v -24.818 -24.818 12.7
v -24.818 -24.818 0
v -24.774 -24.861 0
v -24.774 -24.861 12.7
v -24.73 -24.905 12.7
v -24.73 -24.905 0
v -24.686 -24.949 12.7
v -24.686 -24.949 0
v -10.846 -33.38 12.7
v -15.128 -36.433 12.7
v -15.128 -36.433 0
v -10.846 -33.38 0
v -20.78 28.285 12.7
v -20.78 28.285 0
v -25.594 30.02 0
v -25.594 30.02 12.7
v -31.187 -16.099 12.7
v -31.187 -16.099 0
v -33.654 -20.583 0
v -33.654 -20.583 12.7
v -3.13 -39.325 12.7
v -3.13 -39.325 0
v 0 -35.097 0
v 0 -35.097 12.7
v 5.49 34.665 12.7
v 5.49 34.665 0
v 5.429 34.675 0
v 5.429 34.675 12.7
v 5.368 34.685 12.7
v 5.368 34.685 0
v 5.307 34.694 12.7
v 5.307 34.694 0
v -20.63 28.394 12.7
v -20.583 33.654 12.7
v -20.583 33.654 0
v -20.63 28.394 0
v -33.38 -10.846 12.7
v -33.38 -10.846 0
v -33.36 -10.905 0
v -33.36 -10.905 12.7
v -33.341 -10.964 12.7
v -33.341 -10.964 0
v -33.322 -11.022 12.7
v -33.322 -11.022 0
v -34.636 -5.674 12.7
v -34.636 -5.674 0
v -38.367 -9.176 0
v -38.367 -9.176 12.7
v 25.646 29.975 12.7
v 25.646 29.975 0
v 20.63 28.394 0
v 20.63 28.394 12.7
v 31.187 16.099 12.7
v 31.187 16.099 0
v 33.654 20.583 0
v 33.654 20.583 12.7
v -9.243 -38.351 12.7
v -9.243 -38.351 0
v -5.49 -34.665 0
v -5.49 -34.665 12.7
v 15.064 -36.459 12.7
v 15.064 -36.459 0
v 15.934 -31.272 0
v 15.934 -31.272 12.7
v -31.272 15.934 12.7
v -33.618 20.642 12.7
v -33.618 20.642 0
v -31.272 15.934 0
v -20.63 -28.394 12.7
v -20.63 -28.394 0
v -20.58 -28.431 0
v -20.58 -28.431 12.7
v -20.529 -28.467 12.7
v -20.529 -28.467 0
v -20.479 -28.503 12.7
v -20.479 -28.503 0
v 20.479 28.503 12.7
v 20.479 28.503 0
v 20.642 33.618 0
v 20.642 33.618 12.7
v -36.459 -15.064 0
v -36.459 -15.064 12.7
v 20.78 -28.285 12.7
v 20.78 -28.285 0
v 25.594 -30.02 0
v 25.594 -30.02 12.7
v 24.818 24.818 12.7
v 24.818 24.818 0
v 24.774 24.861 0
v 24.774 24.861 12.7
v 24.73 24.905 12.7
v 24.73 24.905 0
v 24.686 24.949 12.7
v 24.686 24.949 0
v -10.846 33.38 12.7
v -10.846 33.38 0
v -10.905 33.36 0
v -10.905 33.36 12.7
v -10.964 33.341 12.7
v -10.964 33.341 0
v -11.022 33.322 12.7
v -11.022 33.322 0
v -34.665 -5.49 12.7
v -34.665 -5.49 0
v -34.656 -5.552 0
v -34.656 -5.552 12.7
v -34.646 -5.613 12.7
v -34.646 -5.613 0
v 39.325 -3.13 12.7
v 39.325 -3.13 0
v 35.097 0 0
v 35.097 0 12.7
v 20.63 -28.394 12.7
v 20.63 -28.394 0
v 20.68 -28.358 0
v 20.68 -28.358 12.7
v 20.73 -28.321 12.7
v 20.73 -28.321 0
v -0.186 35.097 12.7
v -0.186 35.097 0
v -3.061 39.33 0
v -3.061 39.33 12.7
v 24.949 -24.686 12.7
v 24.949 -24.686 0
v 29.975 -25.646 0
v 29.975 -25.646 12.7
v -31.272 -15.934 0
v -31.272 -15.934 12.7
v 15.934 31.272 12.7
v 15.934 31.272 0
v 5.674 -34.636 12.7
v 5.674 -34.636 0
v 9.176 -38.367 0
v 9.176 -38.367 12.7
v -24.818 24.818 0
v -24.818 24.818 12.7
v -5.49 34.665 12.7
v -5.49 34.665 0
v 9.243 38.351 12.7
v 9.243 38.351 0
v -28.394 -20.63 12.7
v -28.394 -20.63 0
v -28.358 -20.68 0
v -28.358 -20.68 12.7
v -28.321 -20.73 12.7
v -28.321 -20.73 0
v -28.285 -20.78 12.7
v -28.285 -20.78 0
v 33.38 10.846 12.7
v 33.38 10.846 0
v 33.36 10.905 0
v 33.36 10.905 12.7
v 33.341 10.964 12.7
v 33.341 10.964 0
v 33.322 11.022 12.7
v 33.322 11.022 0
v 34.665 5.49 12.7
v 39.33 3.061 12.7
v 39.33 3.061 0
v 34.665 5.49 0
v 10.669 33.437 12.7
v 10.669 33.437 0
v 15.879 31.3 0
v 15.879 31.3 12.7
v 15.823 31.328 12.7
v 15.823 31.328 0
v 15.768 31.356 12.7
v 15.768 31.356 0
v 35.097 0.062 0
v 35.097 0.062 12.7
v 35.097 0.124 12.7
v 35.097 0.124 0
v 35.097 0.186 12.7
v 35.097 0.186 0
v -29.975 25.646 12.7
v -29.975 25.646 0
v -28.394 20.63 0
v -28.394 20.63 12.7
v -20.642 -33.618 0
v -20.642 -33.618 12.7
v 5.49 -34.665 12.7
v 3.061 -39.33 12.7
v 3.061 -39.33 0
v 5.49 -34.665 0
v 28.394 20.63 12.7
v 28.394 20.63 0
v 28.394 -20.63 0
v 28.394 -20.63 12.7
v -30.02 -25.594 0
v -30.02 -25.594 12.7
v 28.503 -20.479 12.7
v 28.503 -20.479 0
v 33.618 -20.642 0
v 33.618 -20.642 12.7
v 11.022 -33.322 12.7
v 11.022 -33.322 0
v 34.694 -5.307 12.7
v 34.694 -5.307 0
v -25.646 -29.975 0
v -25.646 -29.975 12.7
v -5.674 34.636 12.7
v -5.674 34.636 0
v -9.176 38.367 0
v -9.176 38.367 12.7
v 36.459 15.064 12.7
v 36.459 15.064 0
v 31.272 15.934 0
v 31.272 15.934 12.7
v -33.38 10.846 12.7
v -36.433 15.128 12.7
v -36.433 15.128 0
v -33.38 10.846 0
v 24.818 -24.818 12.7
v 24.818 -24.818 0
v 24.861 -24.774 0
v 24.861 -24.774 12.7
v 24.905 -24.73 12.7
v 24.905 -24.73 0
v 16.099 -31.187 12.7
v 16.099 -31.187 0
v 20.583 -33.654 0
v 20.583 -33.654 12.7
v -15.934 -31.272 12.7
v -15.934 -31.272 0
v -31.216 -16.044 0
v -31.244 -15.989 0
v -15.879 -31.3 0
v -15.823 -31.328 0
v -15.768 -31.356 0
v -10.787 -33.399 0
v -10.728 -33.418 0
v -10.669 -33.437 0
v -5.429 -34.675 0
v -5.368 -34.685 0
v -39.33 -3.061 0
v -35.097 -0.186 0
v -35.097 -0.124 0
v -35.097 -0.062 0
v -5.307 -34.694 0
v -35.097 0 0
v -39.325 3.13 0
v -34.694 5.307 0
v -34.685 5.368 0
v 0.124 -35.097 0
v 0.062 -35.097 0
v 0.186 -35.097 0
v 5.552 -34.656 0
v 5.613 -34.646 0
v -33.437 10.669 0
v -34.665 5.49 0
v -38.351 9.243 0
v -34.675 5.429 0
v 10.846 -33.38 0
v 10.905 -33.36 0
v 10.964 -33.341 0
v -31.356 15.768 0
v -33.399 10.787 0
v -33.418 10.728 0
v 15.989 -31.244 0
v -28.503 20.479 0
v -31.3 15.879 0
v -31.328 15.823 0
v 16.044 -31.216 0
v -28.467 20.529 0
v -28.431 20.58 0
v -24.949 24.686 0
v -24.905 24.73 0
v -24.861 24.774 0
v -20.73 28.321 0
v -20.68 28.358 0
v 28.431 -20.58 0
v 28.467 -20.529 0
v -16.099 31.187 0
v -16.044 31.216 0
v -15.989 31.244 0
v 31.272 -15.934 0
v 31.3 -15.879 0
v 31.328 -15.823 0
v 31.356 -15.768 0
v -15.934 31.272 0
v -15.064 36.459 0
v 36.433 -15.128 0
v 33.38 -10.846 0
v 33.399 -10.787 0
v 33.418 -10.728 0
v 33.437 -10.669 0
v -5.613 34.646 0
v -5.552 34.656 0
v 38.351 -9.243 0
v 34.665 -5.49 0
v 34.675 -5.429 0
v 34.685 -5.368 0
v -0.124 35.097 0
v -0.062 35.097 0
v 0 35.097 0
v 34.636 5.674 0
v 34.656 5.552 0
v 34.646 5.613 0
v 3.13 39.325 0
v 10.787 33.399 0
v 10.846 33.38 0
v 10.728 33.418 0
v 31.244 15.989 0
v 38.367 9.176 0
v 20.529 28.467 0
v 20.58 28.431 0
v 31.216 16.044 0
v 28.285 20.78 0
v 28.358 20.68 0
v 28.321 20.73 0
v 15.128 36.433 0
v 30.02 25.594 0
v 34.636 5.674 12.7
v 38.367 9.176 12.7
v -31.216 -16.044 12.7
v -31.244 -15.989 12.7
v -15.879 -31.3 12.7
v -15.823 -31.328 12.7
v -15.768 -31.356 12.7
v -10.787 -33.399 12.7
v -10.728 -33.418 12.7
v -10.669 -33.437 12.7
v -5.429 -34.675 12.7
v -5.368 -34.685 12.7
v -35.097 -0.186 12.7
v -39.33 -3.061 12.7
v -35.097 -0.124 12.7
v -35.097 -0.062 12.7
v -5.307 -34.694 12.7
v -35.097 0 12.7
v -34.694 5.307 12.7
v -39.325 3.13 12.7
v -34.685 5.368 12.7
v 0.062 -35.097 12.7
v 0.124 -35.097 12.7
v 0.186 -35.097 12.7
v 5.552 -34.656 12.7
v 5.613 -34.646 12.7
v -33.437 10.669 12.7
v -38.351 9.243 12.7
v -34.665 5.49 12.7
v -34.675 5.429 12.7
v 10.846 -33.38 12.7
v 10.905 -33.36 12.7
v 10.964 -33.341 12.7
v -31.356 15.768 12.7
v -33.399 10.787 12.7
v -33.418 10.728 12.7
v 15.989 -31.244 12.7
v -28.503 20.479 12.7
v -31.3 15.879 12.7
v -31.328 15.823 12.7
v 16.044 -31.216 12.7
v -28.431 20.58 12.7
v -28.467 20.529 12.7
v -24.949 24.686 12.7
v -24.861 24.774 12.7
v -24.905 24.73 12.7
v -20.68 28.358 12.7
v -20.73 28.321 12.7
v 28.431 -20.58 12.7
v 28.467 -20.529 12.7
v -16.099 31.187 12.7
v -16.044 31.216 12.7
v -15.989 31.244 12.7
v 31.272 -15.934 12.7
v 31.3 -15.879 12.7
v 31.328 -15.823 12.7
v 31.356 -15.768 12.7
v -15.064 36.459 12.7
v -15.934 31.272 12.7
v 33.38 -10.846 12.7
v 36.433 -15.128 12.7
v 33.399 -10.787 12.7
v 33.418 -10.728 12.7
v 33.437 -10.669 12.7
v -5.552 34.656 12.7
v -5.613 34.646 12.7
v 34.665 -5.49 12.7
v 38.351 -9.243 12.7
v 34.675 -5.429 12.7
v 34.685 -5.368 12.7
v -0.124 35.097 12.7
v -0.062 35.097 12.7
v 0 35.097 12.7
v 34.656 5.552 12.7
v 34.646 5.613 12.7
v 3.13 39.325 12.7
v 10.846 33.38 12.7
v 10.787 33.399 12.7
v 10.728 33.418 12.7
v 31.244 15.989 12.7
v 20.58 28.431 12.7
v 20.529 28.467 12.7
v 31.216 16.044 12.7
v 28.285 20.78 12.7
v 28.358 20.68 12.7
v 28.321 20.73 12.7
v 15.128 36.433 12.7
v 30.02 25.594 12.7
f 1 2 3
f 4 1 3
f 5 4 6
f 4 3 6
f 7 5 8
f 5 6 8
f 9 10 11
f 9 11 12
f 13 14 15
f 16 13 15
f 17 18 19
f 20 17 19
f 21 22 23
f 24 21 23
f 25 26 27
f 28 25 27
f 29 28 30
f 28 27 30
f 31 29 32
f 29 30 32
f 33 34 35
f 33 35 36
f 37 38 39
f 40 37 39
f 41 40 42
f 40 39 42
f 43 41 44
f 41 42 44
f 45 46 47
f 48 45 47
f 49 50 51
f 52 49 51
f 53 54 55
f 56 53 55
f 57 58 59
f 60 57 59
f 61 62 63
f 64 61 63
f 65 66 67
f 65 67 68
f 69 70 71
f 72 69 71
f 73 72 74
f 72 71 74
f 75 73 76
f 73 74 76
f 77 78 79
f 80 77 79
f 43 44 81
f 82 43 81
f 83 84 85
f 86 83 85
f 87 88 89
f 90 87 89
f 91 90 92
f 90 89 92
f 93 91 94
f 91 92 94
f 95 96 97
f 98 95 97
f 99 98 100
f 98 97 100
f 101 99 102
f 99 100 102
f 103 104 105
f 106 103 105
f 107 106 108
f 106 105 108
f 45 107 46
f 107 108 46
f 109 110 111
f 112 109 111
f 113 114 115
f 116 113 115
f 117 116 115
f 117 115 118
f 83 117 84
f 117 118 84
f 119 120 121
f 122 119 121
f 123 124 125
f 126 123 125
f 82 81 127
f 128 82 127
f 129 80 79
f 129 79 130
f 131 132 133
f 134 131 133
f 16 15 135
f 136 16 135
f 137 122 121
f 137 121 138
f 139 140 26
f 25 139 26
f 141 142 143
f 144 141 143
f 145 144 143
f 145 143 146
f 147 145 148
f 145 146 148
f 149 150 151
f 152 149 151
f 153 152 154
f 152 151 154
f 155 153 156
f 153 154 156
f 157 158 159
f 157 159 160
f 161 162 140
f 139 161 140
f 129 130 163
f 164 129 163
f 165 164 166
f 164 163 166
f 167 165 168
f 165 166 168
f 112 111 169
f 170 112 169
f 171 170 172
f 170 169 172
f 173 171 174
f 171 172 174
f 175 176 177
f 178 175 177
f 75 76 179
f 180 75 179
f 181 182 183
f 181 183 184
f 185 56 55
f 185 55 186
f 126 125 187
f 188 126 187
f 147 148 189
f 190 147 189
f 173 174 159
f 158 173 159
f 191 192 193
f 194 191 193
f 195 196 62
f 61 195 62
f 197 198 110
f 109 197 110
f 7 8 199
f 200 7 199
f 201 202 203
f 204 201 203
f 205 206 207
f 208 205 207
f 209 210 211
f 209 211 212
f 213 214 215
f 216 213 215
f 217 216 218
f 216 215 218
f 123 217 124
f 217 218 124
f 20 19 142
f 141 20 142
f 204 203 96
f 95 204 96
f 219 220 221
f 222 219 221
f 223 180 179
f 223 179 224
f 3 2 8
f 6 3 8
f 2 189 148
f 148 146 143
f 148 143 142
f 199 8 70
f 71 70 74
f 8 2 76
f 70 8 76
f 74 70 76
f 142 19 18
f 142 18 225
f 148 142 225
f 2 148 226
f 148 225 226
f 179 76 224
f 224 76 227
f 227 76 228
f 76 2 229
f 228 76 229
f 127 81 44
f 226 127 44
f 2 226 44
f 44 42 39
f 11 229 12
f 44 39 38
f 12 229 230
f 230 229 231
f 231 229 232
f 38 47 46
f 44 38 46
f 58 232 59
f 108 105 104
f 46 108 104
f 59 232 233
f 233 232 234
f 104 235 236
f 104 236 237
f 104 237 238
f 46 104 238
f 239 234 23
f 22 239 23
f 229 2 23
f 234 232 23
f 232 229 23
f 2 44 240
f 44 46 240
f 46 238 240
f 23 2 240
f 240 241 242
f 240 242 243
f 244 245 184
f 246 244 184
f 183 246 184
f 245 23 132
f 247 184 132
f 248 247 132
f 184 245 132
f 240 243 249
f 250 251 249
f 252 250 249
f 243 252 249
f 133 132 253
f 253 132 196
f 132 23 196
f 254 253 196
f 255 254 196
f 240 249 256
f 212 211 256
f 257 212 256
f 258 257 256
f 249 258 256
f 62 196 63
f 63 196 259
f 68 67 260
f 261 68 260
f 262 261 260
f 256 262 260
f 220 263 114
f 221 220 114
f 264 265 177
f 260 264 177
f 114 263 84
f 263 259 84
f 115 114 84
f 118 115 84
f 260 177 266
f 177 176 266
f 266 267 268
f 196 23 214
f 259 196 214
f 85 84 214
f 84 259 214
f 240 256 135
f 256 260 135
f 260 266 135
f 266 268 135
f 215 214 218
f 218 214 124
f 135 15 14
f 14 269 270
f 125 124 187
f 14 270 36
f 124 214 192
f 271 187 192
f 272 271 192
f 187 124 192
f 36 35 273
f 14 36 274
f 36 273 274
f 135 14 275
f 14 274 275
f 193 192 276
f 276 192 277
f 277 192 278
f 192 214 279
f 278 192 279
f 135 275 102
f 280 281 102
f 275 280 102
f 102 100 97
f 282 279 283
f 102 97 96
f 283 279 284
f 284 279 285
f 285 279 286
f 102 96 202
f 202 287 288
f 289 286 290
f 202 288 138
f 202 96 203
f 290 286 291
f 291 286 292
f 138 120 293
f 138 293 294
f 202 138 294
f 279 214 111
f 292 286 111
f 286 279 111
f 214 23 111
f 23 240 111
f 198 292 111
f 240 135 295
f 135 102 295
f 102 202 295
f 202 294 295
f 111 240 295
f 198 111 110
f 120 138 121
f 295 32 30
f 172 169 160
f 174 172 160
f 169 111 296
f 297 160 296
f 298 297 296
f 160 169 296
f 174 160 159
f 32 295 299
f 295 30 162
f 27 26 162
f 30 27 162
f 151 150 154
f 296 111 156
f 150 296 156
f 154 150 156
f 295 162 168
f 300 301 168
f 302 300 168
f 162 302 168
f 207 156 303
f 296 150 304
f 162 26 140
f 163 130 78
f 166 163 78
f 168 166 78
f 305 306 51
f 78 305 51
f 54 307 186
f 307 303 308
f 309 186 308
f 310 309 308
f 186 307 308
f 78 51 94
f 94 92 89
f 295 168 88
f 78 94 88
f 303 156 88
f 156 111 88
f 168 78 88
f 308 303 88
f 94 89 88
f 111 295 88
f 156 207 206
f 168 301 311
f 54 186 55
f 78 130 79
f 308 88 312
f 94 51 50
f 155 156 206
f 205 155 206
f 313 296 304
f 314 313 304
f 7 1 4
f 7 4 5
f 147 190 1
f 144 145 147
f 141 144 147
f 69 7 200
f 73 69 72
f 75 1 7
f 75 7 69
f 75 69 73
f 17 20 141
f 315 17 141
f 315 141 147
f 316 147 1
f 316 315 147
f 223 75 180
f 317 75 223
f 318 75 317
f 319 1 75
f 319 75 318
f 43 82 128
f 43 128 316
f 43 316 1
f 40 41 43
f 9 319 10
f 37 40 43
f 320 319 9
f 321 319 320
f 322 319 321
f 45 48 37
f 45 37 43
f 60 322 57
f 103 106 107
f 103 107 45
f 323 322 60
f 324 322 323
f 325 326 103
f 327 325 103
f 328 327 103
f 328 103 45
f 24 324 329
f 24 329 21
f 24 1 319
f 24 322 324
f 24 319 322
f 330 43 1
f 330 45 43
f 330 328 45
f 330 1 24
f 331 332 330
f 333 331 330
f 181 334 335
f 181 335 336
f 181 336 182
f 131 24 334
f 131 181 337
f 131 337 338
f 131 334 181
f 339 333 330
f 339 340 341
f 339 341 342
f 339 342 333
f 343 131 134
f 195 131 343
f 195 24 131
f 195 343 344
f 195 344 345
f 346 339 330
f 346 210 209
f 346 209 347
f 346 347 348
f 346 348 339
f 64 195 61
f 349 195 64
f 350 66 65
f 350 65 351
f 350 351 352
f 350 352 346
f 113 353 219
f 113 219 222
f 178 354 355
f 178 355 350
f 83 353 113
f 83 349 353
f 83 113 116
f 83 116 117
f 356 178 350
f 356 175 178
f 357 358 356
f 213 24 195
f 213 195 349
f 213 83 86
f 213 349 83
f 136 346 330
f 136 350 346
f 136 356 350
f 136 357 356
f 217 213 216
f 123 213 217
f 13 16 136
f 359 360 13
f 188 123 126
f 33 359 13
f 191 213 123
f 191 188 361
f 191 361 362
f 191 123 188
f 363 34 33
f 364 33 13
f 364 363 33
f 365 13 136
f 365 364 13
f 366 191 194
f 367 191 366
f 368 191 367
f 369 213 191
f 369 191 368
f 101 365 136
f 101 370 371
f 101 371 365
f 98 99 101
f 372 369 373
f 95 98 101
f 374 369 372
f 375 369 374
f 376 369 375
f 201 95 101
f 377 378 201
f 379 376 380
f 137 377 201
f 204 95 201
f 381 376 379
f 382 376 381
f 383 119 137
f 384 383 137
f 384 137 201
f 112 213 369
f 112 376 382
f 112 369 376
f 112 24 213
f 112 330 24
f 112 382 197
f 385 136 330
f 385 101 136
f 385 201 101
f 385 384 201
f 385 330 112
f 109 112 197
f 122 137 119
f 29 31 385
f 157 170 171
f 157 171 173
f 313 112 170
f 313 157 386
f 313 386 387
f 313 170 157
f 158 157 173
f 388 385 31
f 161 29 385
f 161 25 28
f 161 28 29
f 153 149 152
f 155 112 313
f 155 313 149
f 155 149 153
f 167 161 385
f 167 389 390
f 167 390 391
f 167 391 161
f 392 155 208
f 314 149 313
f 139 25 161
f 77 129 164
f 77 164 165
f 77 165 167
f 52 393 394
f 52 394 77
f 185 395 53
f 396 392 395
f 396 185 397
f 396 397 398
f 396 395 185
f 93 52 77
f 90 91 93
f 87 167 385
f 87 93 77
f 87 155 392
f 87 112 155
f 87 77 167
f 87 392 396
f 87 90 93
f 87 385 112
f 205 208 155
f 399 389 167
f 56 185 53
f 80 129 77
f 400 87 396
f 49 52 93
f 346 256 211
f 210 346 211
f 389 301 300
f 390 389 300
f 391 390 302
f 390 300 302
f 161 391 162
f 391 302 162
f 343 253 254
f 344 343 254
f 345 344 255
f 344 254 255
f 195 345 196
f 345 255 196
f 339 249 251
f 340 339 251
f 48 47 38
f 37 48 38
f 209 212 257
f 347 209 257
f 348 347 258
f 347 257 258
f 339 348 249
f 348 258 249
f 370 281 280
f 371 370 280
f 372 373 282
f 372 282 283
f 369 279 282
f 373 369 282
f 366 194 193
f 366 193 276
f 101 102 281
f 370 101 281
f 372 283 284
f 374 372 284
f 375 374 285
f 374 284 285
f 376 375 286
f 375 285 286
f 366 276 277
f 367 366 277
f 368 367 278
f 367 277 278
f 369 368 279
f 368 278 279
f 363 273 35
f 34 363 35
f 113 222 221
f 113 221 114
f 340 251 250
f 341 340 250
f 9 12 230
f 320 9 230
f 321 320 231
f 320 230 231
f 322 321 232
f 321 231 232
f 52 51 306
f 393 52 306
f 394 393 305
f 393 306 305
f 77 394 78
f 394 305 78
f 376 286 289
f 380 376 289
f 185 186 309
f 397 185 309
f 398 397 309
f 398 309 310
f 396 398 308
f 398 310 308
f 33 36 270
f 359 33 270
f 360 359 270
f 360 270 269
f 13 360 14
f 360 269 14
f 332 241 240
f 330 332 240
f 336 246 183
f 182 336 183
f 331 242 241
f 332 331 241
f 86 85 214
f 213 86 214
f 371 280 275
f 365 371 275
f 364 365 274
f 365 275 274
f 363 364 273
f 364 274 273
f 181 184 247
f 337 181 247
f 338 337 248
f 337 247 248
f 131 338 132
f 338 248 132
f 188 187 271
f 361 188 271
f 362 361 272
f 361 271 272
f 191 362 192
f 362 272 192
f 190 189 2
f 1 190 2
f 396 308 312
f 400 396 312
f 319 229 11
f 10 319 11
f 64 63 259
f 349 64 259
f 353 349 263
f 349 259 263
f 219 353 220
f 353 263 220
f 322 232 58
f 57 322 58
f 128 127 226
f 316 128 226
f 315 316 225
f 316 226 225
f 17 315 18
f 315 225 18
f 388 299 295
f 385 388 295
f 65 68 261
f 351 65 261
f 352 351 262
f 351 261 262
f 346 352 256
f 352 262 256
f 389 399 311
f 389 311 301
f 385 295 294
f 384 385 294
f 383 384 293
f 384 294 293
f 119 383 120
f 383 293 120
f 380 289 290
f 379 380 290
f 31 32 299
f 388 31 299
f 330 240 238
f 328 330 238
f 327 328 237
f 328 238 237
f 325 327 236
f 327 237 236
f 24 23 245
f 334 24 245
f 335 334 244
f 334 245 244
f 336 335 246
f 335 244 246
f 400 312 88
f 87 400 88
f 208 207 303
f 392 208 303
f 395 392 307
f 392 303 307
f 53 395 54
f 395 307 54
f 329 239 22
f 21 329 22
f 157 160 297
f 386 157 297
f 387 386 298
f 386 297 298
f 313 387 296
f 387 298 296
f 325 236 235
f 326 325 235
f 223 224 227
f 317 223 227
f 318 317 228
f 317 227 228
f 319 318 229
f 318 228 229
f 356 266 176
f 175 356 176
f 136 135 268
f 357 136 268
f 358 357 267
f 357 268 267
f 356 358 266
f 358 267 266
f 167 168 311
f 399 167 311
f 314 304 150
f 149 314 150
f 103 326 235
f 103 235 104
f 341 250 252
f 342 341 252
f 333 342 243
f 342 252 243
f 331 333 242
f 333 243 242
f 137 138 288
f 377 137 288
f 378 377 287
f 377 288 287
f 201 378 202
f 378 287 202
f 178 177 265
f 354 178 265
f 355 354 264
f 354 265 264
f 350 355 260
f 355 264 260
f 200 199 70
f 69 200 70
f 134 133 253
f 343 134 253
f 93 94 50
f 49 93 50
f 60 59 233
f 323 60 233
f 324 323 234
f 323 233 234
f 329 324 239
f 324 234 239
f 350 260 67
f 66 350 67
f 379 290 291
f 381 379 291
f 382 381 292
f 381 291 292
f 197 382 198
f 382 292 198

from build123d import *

# Parameters (mm, degrees)
F1_DEPTH = 12.7


with BuildPart() as f1:
    # F0 (on Top) → F1 (new body)
    with BuildSketch(Plane.XY):
        with BuildLine():
            ThreePointArc((34.693947, -5.306769), (34.996437, -2.661044), (35.09746, 0))
            ThreePointArc((35.09746, 0), (35.097337, 0.092948), (35.096968, 0.185896))
            ThreePointArc((35.096968, 0.185896), (34.981851, 2.846367), (34.665353, 5.490452))
            ThreePointArc((34.665353, 5.490452), (34.650691, 5.582237), (34.635786, 5.673982))
            ThreePointArc((34.635786, 5.673982), (34.105897, 8.283691), (33.379669, 10.845712))
            ThreePointArc((33.379669, 10.845712), (33.350829, 10.934073), (33.321755, 11.022357))
            ThreePointArc((33.321755, 11.022357), (32.390142, 13.517042), (31.272066, 15.933914))
            ThreePointArc((31.272066, 15.933914), (31.229759, 16.016675), (31.187233, 16.099324))
            ThreePointArc((31.187233, 16.099324), (29.876834, 18.41756), (28.394442, 20.62977))
            ThreePointArc((28.394442, 20.62977), (28.339709, 20.704894), (28.284777, 20.779873))
            ThreePointArc((28.284777, 20.779873), (26.62786, 22.864576), (24.817652, 24.817652))
            ThreePointArc((24.817652, 24.817652), (24.751841, 24.88329), (24.685856, 24.948752))
            ThreePointArc((24.685856, 24.948752), (22.723219, 26.74859), (20.62977, 28.394442))
            ThreePointArc((20.62977, 28.394442), (20.554501, 28.448976), (20.479088, 28.50331))
            ThreePointArc((20.479088, 28.50331), (18.259057, 29.973965), (15.933914, 31.272066))
            ThreePointArc((15.933914, 31.272066), (15.85104, 31.314154), (15.768056, 31.356022))
            ThreePointArc((15.768056, 31.356022), (13.345297, 32.461281), (10.845712, 33.379669))
            ThreePointArc((10.845712, 33.379669), (10.757275, 33.408274), (10.668762, 33.436645))
            ThreePointArc((10.668762, 33.436645), (8.102931, 34.149293), (5.490452, 34.665353))
            ThreePointArc((5.490452, 34.665353), (5.398629, 34.679771), (5.306769, 34.693947))
            ThreePointArc((5.306769, 34.693947), (2.661044, 34.996437), (0, 35.09746))
            ThreePointArc((0, 35.09746), (-0.092948, 35.097337), (-0.185896, 35.096968))
            ThreePointArc((-0.185896, 35.096968), (-2.846367, 34.981851), (-5.490452, 34.665353))
            ThreePointArc((-5.490452, 34.665353), (-5.582237, 34.650691), (-5.673982, 34.635786))
            ThreePointArc((-5.673982, 34.635786), (-8.283691, 34.105897), (-10.845712, 33.379669))
            ThreePointArc((-10.845712, 33.379669), (-10.934073, 33.350829), (-11.022357, 33.321755))
            ThreePointArc((-11.022357, 33.321755), (-13.517042, 32.390142), (-15.933914, 31.272066))
            ThreePointArc((-15.933914, 31.272066), (-16.016675, 31.229759), (-16.099324, 31.187233))
            ThreePointArc((-16.099324, 31.187233), (-18.41756, 29.876834), (-20.62977, 28.394442))
            ThreePointArc((-20.62977, 28.394442), (-20.704894, 28.339709), (-20.779873, 28.284777))
            ThreePointArc((-20.779873, 28.284777), (-22.864576, 26.62786), (-24.817652, 24.817652))
            ThreePointArc((-24.817652, 24.817652), (-24.88329, 24.751841), (-24.948752, 24.685856))
            ThreePointArc((-24.948752, 24.685856), (-26.74859, 22.723219), (-28.394442, 20.62977))
            ThreePointArc((-28.394442, 20.62977), (-28.448976, 20.554501), (-28.50331, 20.479088))
            ThreePointArc((-28.50331, 20.479088), (-29.973965, 18.259057), (-31.272066, 15.933914))
            ThreePointArc((-31.272066, 15.933914), (-31.314154, 15.85104), (-31.356022, 15.768056))
            ThreePointArc((-31.356022, 15.768056), (-32.461281, 13.345297), (-33.379669, 10.845712))
            ThreePointArc((-33.379669, 10.845712), (-33.408274, 10.757275), (-33.436645, 10.668762))
            ThreePointArc((-33.436645, 10.668762), (-34.149293, 8.102931), (-34.665353, 5.490452))
            ThreePointArc((-34.665353, 5.490452), (-34.679771, 5.398629), (-34.693947, 5.306769))
            ThreePointArc((-34.693947, 5.306769), (-34.996437, 2.661044), (-35.09746, 0))
            ThreePointArc((-35.09746, 0), (-35.097337, -0.092948), (-35.096968, -0.185896))
            ThreePointArc((-35.096968, -0.185896), (-34.981851, -2.846367), (-34.665353, -5.490452))
            ThreePointArc((-34.665353, -5.490452), (-34.650691, -5.582237), (-34.635786, -5.673982))
            ThreePointArc((-34.635786, -5.673982), (-34.105897, -8.283691), (-33.379669, -10.845712))
            ThreePointArc((-33.379669, -10.845712), (-33.350829, -10.934073), (-33.321755, -11.022357))
            ThreePointArc((-33.321755, -11.022357), (-32.390142, -13.517042), (-31.272066, -15.933914))
            ThreePointArc((-31.272066, -15.933914), (-31.229759, -16.016675), (-31.187233, -16.099324))
            ThreePointArc((-31.187233, -16.099324), (-29.876834, -18.41756), (-28.394442, -20.62977))
            ThreePointArc((-28.394442, -20.62977), (-28.339709, -20.704894), (-28.284777, -20.779873))
            ThreePointArc((-28.284777, -20.779873), (-26.62786, -22.864576), (-24.817652, -24.817652))
            ThreePointArc((-24.817652, -24.817652), (-24.751841, -24.88329), (-24.685856, -24.948752))
            ThreePointArc((-24.685856, -24.948752), (-22.723219, -26.74859), (-20.62977, -28.394442))
            ThreePointArc((-20.62977, -28.394442), (-20.554501, -28.448976), (-20.479088, -28.50331))
            ThreePointArc((-20.479088, -28.50331), (-18.259057, -29.973965), (-15.933914, -31.272066))
            ThreePointArc((-15.933914, -31.272066), (-15.85104, -31.314154), (-15.768056, -31.356022))
            ThreePointArc((-15.768056, -31.356022), (-13.345297, -32.461281), (-10.845712, -33.379669))
            ThreePointArc((-10.845712, -33.379669), (-10.757275, -33.408274), (-10.668762, -33.436645))
            ThreePointArc((-10.668762, -33.436645), (-8.102931, -34.149293), (-5.490452, -34.665353))
            ThreePointArc((-5.490452, -34.665353), (-5.398629, -34.679771), (-5.306769, -34.693947))
            ThreePointArc((-5.306769, -34.693947), (-2.661044, -34.996437), (0, -35.09746))
            ThreePointArc((0, -35.09746), (0.092948, -35.097337), (0.185896, -35.096968))
            ThreePointArc((0.185896, -35.096968), (2.846367, -34.981851), (5.490452, -34.665353))
            ThreePointArc((5.490452, -34.665353), (5.582237, -34.650691), (5.673982, -34.635786))
            ThreePointArc((5.673982, -34.635786), (8.283691, -34.105897), (10.845712, -33.379669))
            ThreePointArc((10.845712, -33.379669), (10.934073, -33.350829), (11.022357, -33.321755))
            ThreePointArc((11.022357, -33.321755), (13.517042, -32.390142), (15.933914, -31.272066))
            ThreePointArc((15.933914, -31.272066), (16.016675, -31.229759), (16.099324, -31.187233))
            ThreePointArc((16.099324, -31.187233), (18.41756, -29.876834), (20.62977, -28.394442))
            ThreePointArc((20.62977, -28.394442), (20.704894, -28.339709), (20.779873, -28.284777))
            ThreePointArc((20.779873, -28.284777), (22.864576, -26.62786), (24.817652, -24.817652))
            ThreePointArc((24.817652, -24.817652), (24.88329, -24.751841), (24.948752, -24.685856))
            ThreePointArc((24.948752, -24.685856), (26.74859, -22.723219), (28.394442, -20.62977))
            ThreePointArc((28.394442, -20.62977), (28.448976, -20.554501), (28.50331, -20.479088))
            ThreePointArc((28.50331, -20.479088), (29.973965, -18.259057), (31.272066, -15.933914))
            ThreePointArc((31.272066, -15.933914), (31.314154, -15.85104), (31.356022, -15.768056))
            ThreePointArc((31.356022, -15.768056), (32.461281, -13.345297), (33.379669, -10.845712))
            ThreePointArc((33.379669, -10.845712), (33.408274, -10.757275), (33.436645, -10.668762))
            ThreePointArc((33.436645, -10.668762), (34.149293, -8.102931), (34.665353, -5.490452))
            ThreePointArc((34.665353, -5.490452), (34.679771, -5.398629), (34.693947, -5.306769))
        make_face()
        with BuildLine():
            Line((39.324641, -3.129642), (35.09746, 0))
            ThreePointArc((35.09746, 0), (34.996437, -2.661044), (34.693947, -5.306769))
            Line((34.693947, -5.306769), (39.324641, -3.129642))
        make_face()
        with BuildLine():
            ThreePointArc((34.665353, 5.490452), (34.981851, 2.846367), (35.096968, 0.185896))
            Line((35.096968, 0.185896), (39.330073, 3.060619))
            Line((39.330073, 3.060619), (34.665353, 5.490452))
        make_face()
        with BuildLine():
            Line((38.350906, -9.24284), (34.665353, -5.490452))
            ThreePointArc((34.665353, -5.490452), (34.149293, -8.102931), (33.436645, -10.668762))
            Line((33.436645, -10.668762), (38.350906, -9.24284))
        make_face()
        with BuildLine():
            ThreePointArc((33.379669, 10.845712), (34.105897, 8.283691), (34.635786, 5.673982))
            Line((34.635786, 5.673982), (38.367069, 9.175516))
            Line((38.367069, 9.175516), (33.379669, 10.845712))
        make_face()
        with BuildLine():
            Line((36.432844, -15.128449), (33.379669, -10.845712))
            ThreePointArc((33.379669, -10.845712), (32.461281, -13.345297), (31.356022, -15.768056))
            Line((31.356022, -15.768056), (36.432844, -15.128449))
        make_face()
        with BuildLine():
            ThreePointArc((31.272066, 15.933914), (32.390142, 13.517042), (33.321755, 11.022357))
            Line((33.321755, 11.022357), (36.45934, 15.064482))
            Line((36.45934, 15.064482), (31.272066, 15.933914))
        make_face()
        with BuildLine():
            Line((33.617684, -20.641545), (31.272066, -15.933914))
            ThreePointArc((31.272066, -15.933914), (29.973965, -18.259057), (28.50331, -20.479088))
            Line((28.50331, -20.479088), (33.617684, -20.641545))
        make_face()
        with BuildLine():
            ThreePointArc((28.394442, 20.62977), (29.876834, 18.41756), (31.187233, 16.099324))
            Line((31.187233, 16.099324), (33.65386, 20.582511))
            Line((33.65386, 20.582511), (28.394442, 20.62977))
        make_face()
        with BuildLine():
            Line((29.974746, -25.646378), (28.394442, -20.62977))
            ThreePointArc((28.394442, -20.62977), (26.74859, -22.723219), (24.948752, -24.685856))
            Line((24.948752, -24.685856), (29.974746, -25.646378))
        make_face()
        with BuildLine():
            ThreePointArc((24.817652, 24.817652), (26.62786, 22.864576), (28.284777, 20.779873))
            Line((28.284777, 20.779873), (30.019711, 25.59373))
            Line((30.019711, 25.59373), (24.817652, 24.817652))
        make_face()
        with BuildLine():
            Line((25.59373, -30.019711), (24.817652, -24.817652))
            ThreePointArc((24.817652, -24.817652), (22.864576, -26.62786), (20.779873, -28.284777))
            Line((20.779873, -28.284777), (25.59373, -30.019711))
        make_face()
        with BuildLine():
            ThreePointArc((20.62977, 28.394442), (22.723219, 26.74859), (24.685856, 24.948752))
            Line((24.685856, 24.948752), (25.646378, 29.974746))
            Line((25.646378, 29.974746), (20.62977, 28.394442))
        make_face()
        with BuildLine():
            Line((20.582511, -33.65386), (20.62977, -28.394442))
            ThreePointArc((20.62977, -28.394442), (18.41756, -29.876834), (16.099324, -31.187233))
            Line((16.099324, -31.187233), (20.582511, -33.65386))
        make_face()
        with BuildLine():
            ThreePointArc((15.933914, 31.272066), (18.259057, 29.973965), (20.479088, 28.50331))
            Line((20.479088, 28.50331), (20.641545, 33.617684))
            Line((20.641545, 33.617684), (15.933914, 31.272066))
        make_face()
        with BuildLine():
            Line((15.064482, -36.45934), (15.933914, -31.272066))
            ThreePointArc((15.933914, -31.272066), (13.517042, -32.390142), (11.022357, -33.321755))
            Line((11.022357, -33.321755), (15.064482, -36.45934))
        make_face()
        with BuildLine():
            ThreePointArc((10.845712, 33.379669), (13.345297, 32.461281), (15.768056, 31.356022))
            Line((15.768056, 31.356022), (15.128449, 36.432844))
            Line((15.128449, 36.432844), (10.845712, 33.379669))
        make_face()
        with BuildLine():
            Line((9.175516, -38.367069), (10.845712, -33.379669))
            ThreePointArc((10.845712, -33.379669), (8.283691, -34.105897), (5.673982, -34.635786))
            Line((5.673982, -34.635786), (9.175516, -38.367069))
        make_face()
        with BuildLine():
            ThreePointArc((5.490452, 34.665353), (8.102931, 34.149293), (10.668762, 33.436645))
            Line((10.668762, 33.436645), (9.24284, 38.350906))
            Line((9.24284, 38.350906), (5.490452, 34.665353))
        make_face()
        with BuildLine():
            Line((3.060619, -39.330073), (5.490452, -34.665353))
            ThreePointArc((5.490452, -34.665353), (2.846367, -34.981851), (0.185896, -35.096968))
            Line((0.185896, -35.096968), (3.060619, -39.330073))
        make_face()
        with BuildLine():
            ThreePointArc((0, 35.09746), (2.661044, 34.996437), (5.306769, 34.693947))
            Line((5.306769, 34.693947), (3.129642, 39.324641))
            Line((3.129642, 39.324641), (0, 35.09746))
        make_face()
        with BuildLine():
            Line((-3.129642, -39.324641), (0, -35.09746))
            ThreePointArc((0, -35.09746), (-2.661044, -34.996437), (-5.306769, -34.693947))
            Line((-5.306769, -34.693947), (-3.129642, -39.324641))
        make_face()
        with BuildLine():
            ThreePointArc((-5.490452, 34.665353), (-2.846367, 34.981851), (-0.185896, 35.096968))
            Line((-0.185896, 35.096968), (-3.060619, 39.330073))
            Line((-3.060619, 39.330073), (-5.490452, 34.665353))
        make_face()
        with BuildLine():
            Line((-9.24284, -38.350906), (-5.490452, -34.665353))
            ThreePointArc((-5.490452, -34.665353), (-8.102931, -34.149293), (-10.668762, -33.436645))
            Line((-10.668762, -33.436645), (-9.24284, -38.350906))
        make_face()
        with BuildLine():
            ThreePointArc((-10.845712, 33.379669), (-8.283691, 34.105897), (-5.673982, 34.635786))
            Line((-5.673982, 34.635786), (-9.175516, 38.367069))
            Line((-9.175516, 38.367069), (-10.845712, 33.379669))
        make_face()
        with BuildLine():
            Line((-15.128449, -36.432844), (-10.845712, -33.379669))
            ThreePointArc((-10.845712, -33.379669), (-13.345297, -32.461281), (-15.768056, -31.356022))
            Line((-15.768056, -31.356022), (-15.128449, -36.432844))
        make_face()
        with BuildLine():
            ThreePointArc((-15.933914, 31.272066), (-13.517042, 32.390142), (-11.022357, 33.321755))
            Line((-11.022357, 33.321755), (-15.064482, 36.45934))
            Line((-15.064482, 36.45934), (-15.933914, 31.272066))
        make_face()
        with BuildLine():
            Line((-20.641545, -33.617684), (-15.933914, -31.272066))
            ThreePointArc((-15.933914, -31.272066), (-18.259057, -29.973965), (-20.479088, -28.50331))
            Line((-20.479088, -28.50331), (-20.641545, -33.617684))
        make_face()
        with BuildLine():
            ThreePointArc((-20.62977, 28.394442), (-18.41756, 29.876834), (-16.099324, 31.187233))
            Line((-16.099324, 31.187233), (-20.582511, 33.65386))
            Line((-20.582511, 33.65386), (-20.62977, 28.394442))
        make_face()
        with BuildLine():
            Line((-25.646378, -29.974746), (-20.62977, -28.394442))
            ThreePointArc((-20.62977, -28.394442), (-22.723219, -26.74859), (-24.685856, -24.948752))
            Line((-24.685856, -24.948752), (-25.646378, -29.974746))
        make_face()
        with BuildLine():
            ThreePointArc((-24.817652, 24.817652), (-22.864576, 26.62786), (-20.779873, 28.284777))
            Line((-20.779873, 28.284777), (-25.59373, 30.019711))
            Line((-25.59373, 30.019711), (-24.817652, 24.817652))
        make_face()
        with BuildLine():
            Line((-30.019711, -25.59373), (-24.817652, -24.817652))
            ThreePointArc((-24.817652, -24.817652), (-26.62786, -22.864576), (-28.284777, -20.779873))
            Line((-28.284777, -20.779873), (-30.019711, -25.59373))
        make_face()
        with BuildLine():
            ThreePointArc((-28.394442, 20.62977), (-26.74859, 22.723219), (-24.948752, 24.685856))
            Line((-24.948752, 24.685856), (-29.974746, 25.646378))
            Line((-29.974746, 25.646378), (-28.394442, 20.62977))
        make_face()
        with BuildLine():
            Line((-33.65386, -20.582511), (-28.394442, -20.62977))
            ThreePointArc((-28.394442, -20.62977), (-29.876834, -18.41756), (-31.187233, -16.099324))
            Line((-31.187233, -16.099324), (-33.65386, -20.582511))
        make_face()
        with BuildLine():
            ThreePointArc((-31.272066, 15.933914), (-29.973965, 18.259057), (-28.50331, 20.479088))
            Line((-28.50331, 20.479088), (-33.617684, 20.641545))
            Line((-33.617684, 20.641545), (-31.272066, 15.933914))
        make_face()
        with BuildLine():
            Line((-36.45934, -15.064482), (-31.272066, -15.933914))
            ThreePointArc((-31.272066, -15.933914), (-32.390142, -13.517042), (-33.321755, -11.022357))
            Line((-33.321755, -11.022357), (-36.45934, -15.064482))
        make_face()
        with BuildLine():
            ThreePointArc((-33.379669, 10.845712), (-32.461281, 13.345297), (-31.356022, 15.768056))
            Line((-31.356022, 15.768056), (-36.432844, 15.128449))
            Line((-36.432844, 15.128449), (-33.379669, 10.845712))
        make_face()
        with BuildLine():
            Line((-38.367069, -9.175516), (-33.379669, -10.845712))
            ThreePointArc((-33.379669, -10.845712), (-34.105897, -8.283691), (-34.635786, -5.673982))
            Line((-34.635786, -5.673982), (-38.367069, -9.175516))
        make_face()
        with BuildLine():
            ThreePointArc((-34.665353, 5.490452), (-34.149293, 8.102931), (-33.436645, 10.668762))
            Line((-33.436645, 10.668762), (-38.350906, 9.24284))
            Line((-38.350906, 9.24284), (-34.665353, 5.490452))
        make_face()
        with BuildLine():
            Line((-39.330073, -3.060619), (-34.665353, -5.490452))
            ThreePointArc((-34.665353, -5.490452), (-34.981851, -2.846367), (-35.096968, -0.185896))
            Line((-35.096968, -0.185896), (-39.330073, -3.060619))
        make_face()
        with BuildLine():
            ThreePointArc((-35.09746, 0), (-34.996437, 2.661044), (-34.693947, 5.306769))
            Line((-34.693947, 5.306769), (-39.324641, 3.129642))
            Line((-39.324641, 3.129642), (-35.09746, 0))
        make_face()
    extrude(amount=F1_DEPTH)


solid = f1.part
